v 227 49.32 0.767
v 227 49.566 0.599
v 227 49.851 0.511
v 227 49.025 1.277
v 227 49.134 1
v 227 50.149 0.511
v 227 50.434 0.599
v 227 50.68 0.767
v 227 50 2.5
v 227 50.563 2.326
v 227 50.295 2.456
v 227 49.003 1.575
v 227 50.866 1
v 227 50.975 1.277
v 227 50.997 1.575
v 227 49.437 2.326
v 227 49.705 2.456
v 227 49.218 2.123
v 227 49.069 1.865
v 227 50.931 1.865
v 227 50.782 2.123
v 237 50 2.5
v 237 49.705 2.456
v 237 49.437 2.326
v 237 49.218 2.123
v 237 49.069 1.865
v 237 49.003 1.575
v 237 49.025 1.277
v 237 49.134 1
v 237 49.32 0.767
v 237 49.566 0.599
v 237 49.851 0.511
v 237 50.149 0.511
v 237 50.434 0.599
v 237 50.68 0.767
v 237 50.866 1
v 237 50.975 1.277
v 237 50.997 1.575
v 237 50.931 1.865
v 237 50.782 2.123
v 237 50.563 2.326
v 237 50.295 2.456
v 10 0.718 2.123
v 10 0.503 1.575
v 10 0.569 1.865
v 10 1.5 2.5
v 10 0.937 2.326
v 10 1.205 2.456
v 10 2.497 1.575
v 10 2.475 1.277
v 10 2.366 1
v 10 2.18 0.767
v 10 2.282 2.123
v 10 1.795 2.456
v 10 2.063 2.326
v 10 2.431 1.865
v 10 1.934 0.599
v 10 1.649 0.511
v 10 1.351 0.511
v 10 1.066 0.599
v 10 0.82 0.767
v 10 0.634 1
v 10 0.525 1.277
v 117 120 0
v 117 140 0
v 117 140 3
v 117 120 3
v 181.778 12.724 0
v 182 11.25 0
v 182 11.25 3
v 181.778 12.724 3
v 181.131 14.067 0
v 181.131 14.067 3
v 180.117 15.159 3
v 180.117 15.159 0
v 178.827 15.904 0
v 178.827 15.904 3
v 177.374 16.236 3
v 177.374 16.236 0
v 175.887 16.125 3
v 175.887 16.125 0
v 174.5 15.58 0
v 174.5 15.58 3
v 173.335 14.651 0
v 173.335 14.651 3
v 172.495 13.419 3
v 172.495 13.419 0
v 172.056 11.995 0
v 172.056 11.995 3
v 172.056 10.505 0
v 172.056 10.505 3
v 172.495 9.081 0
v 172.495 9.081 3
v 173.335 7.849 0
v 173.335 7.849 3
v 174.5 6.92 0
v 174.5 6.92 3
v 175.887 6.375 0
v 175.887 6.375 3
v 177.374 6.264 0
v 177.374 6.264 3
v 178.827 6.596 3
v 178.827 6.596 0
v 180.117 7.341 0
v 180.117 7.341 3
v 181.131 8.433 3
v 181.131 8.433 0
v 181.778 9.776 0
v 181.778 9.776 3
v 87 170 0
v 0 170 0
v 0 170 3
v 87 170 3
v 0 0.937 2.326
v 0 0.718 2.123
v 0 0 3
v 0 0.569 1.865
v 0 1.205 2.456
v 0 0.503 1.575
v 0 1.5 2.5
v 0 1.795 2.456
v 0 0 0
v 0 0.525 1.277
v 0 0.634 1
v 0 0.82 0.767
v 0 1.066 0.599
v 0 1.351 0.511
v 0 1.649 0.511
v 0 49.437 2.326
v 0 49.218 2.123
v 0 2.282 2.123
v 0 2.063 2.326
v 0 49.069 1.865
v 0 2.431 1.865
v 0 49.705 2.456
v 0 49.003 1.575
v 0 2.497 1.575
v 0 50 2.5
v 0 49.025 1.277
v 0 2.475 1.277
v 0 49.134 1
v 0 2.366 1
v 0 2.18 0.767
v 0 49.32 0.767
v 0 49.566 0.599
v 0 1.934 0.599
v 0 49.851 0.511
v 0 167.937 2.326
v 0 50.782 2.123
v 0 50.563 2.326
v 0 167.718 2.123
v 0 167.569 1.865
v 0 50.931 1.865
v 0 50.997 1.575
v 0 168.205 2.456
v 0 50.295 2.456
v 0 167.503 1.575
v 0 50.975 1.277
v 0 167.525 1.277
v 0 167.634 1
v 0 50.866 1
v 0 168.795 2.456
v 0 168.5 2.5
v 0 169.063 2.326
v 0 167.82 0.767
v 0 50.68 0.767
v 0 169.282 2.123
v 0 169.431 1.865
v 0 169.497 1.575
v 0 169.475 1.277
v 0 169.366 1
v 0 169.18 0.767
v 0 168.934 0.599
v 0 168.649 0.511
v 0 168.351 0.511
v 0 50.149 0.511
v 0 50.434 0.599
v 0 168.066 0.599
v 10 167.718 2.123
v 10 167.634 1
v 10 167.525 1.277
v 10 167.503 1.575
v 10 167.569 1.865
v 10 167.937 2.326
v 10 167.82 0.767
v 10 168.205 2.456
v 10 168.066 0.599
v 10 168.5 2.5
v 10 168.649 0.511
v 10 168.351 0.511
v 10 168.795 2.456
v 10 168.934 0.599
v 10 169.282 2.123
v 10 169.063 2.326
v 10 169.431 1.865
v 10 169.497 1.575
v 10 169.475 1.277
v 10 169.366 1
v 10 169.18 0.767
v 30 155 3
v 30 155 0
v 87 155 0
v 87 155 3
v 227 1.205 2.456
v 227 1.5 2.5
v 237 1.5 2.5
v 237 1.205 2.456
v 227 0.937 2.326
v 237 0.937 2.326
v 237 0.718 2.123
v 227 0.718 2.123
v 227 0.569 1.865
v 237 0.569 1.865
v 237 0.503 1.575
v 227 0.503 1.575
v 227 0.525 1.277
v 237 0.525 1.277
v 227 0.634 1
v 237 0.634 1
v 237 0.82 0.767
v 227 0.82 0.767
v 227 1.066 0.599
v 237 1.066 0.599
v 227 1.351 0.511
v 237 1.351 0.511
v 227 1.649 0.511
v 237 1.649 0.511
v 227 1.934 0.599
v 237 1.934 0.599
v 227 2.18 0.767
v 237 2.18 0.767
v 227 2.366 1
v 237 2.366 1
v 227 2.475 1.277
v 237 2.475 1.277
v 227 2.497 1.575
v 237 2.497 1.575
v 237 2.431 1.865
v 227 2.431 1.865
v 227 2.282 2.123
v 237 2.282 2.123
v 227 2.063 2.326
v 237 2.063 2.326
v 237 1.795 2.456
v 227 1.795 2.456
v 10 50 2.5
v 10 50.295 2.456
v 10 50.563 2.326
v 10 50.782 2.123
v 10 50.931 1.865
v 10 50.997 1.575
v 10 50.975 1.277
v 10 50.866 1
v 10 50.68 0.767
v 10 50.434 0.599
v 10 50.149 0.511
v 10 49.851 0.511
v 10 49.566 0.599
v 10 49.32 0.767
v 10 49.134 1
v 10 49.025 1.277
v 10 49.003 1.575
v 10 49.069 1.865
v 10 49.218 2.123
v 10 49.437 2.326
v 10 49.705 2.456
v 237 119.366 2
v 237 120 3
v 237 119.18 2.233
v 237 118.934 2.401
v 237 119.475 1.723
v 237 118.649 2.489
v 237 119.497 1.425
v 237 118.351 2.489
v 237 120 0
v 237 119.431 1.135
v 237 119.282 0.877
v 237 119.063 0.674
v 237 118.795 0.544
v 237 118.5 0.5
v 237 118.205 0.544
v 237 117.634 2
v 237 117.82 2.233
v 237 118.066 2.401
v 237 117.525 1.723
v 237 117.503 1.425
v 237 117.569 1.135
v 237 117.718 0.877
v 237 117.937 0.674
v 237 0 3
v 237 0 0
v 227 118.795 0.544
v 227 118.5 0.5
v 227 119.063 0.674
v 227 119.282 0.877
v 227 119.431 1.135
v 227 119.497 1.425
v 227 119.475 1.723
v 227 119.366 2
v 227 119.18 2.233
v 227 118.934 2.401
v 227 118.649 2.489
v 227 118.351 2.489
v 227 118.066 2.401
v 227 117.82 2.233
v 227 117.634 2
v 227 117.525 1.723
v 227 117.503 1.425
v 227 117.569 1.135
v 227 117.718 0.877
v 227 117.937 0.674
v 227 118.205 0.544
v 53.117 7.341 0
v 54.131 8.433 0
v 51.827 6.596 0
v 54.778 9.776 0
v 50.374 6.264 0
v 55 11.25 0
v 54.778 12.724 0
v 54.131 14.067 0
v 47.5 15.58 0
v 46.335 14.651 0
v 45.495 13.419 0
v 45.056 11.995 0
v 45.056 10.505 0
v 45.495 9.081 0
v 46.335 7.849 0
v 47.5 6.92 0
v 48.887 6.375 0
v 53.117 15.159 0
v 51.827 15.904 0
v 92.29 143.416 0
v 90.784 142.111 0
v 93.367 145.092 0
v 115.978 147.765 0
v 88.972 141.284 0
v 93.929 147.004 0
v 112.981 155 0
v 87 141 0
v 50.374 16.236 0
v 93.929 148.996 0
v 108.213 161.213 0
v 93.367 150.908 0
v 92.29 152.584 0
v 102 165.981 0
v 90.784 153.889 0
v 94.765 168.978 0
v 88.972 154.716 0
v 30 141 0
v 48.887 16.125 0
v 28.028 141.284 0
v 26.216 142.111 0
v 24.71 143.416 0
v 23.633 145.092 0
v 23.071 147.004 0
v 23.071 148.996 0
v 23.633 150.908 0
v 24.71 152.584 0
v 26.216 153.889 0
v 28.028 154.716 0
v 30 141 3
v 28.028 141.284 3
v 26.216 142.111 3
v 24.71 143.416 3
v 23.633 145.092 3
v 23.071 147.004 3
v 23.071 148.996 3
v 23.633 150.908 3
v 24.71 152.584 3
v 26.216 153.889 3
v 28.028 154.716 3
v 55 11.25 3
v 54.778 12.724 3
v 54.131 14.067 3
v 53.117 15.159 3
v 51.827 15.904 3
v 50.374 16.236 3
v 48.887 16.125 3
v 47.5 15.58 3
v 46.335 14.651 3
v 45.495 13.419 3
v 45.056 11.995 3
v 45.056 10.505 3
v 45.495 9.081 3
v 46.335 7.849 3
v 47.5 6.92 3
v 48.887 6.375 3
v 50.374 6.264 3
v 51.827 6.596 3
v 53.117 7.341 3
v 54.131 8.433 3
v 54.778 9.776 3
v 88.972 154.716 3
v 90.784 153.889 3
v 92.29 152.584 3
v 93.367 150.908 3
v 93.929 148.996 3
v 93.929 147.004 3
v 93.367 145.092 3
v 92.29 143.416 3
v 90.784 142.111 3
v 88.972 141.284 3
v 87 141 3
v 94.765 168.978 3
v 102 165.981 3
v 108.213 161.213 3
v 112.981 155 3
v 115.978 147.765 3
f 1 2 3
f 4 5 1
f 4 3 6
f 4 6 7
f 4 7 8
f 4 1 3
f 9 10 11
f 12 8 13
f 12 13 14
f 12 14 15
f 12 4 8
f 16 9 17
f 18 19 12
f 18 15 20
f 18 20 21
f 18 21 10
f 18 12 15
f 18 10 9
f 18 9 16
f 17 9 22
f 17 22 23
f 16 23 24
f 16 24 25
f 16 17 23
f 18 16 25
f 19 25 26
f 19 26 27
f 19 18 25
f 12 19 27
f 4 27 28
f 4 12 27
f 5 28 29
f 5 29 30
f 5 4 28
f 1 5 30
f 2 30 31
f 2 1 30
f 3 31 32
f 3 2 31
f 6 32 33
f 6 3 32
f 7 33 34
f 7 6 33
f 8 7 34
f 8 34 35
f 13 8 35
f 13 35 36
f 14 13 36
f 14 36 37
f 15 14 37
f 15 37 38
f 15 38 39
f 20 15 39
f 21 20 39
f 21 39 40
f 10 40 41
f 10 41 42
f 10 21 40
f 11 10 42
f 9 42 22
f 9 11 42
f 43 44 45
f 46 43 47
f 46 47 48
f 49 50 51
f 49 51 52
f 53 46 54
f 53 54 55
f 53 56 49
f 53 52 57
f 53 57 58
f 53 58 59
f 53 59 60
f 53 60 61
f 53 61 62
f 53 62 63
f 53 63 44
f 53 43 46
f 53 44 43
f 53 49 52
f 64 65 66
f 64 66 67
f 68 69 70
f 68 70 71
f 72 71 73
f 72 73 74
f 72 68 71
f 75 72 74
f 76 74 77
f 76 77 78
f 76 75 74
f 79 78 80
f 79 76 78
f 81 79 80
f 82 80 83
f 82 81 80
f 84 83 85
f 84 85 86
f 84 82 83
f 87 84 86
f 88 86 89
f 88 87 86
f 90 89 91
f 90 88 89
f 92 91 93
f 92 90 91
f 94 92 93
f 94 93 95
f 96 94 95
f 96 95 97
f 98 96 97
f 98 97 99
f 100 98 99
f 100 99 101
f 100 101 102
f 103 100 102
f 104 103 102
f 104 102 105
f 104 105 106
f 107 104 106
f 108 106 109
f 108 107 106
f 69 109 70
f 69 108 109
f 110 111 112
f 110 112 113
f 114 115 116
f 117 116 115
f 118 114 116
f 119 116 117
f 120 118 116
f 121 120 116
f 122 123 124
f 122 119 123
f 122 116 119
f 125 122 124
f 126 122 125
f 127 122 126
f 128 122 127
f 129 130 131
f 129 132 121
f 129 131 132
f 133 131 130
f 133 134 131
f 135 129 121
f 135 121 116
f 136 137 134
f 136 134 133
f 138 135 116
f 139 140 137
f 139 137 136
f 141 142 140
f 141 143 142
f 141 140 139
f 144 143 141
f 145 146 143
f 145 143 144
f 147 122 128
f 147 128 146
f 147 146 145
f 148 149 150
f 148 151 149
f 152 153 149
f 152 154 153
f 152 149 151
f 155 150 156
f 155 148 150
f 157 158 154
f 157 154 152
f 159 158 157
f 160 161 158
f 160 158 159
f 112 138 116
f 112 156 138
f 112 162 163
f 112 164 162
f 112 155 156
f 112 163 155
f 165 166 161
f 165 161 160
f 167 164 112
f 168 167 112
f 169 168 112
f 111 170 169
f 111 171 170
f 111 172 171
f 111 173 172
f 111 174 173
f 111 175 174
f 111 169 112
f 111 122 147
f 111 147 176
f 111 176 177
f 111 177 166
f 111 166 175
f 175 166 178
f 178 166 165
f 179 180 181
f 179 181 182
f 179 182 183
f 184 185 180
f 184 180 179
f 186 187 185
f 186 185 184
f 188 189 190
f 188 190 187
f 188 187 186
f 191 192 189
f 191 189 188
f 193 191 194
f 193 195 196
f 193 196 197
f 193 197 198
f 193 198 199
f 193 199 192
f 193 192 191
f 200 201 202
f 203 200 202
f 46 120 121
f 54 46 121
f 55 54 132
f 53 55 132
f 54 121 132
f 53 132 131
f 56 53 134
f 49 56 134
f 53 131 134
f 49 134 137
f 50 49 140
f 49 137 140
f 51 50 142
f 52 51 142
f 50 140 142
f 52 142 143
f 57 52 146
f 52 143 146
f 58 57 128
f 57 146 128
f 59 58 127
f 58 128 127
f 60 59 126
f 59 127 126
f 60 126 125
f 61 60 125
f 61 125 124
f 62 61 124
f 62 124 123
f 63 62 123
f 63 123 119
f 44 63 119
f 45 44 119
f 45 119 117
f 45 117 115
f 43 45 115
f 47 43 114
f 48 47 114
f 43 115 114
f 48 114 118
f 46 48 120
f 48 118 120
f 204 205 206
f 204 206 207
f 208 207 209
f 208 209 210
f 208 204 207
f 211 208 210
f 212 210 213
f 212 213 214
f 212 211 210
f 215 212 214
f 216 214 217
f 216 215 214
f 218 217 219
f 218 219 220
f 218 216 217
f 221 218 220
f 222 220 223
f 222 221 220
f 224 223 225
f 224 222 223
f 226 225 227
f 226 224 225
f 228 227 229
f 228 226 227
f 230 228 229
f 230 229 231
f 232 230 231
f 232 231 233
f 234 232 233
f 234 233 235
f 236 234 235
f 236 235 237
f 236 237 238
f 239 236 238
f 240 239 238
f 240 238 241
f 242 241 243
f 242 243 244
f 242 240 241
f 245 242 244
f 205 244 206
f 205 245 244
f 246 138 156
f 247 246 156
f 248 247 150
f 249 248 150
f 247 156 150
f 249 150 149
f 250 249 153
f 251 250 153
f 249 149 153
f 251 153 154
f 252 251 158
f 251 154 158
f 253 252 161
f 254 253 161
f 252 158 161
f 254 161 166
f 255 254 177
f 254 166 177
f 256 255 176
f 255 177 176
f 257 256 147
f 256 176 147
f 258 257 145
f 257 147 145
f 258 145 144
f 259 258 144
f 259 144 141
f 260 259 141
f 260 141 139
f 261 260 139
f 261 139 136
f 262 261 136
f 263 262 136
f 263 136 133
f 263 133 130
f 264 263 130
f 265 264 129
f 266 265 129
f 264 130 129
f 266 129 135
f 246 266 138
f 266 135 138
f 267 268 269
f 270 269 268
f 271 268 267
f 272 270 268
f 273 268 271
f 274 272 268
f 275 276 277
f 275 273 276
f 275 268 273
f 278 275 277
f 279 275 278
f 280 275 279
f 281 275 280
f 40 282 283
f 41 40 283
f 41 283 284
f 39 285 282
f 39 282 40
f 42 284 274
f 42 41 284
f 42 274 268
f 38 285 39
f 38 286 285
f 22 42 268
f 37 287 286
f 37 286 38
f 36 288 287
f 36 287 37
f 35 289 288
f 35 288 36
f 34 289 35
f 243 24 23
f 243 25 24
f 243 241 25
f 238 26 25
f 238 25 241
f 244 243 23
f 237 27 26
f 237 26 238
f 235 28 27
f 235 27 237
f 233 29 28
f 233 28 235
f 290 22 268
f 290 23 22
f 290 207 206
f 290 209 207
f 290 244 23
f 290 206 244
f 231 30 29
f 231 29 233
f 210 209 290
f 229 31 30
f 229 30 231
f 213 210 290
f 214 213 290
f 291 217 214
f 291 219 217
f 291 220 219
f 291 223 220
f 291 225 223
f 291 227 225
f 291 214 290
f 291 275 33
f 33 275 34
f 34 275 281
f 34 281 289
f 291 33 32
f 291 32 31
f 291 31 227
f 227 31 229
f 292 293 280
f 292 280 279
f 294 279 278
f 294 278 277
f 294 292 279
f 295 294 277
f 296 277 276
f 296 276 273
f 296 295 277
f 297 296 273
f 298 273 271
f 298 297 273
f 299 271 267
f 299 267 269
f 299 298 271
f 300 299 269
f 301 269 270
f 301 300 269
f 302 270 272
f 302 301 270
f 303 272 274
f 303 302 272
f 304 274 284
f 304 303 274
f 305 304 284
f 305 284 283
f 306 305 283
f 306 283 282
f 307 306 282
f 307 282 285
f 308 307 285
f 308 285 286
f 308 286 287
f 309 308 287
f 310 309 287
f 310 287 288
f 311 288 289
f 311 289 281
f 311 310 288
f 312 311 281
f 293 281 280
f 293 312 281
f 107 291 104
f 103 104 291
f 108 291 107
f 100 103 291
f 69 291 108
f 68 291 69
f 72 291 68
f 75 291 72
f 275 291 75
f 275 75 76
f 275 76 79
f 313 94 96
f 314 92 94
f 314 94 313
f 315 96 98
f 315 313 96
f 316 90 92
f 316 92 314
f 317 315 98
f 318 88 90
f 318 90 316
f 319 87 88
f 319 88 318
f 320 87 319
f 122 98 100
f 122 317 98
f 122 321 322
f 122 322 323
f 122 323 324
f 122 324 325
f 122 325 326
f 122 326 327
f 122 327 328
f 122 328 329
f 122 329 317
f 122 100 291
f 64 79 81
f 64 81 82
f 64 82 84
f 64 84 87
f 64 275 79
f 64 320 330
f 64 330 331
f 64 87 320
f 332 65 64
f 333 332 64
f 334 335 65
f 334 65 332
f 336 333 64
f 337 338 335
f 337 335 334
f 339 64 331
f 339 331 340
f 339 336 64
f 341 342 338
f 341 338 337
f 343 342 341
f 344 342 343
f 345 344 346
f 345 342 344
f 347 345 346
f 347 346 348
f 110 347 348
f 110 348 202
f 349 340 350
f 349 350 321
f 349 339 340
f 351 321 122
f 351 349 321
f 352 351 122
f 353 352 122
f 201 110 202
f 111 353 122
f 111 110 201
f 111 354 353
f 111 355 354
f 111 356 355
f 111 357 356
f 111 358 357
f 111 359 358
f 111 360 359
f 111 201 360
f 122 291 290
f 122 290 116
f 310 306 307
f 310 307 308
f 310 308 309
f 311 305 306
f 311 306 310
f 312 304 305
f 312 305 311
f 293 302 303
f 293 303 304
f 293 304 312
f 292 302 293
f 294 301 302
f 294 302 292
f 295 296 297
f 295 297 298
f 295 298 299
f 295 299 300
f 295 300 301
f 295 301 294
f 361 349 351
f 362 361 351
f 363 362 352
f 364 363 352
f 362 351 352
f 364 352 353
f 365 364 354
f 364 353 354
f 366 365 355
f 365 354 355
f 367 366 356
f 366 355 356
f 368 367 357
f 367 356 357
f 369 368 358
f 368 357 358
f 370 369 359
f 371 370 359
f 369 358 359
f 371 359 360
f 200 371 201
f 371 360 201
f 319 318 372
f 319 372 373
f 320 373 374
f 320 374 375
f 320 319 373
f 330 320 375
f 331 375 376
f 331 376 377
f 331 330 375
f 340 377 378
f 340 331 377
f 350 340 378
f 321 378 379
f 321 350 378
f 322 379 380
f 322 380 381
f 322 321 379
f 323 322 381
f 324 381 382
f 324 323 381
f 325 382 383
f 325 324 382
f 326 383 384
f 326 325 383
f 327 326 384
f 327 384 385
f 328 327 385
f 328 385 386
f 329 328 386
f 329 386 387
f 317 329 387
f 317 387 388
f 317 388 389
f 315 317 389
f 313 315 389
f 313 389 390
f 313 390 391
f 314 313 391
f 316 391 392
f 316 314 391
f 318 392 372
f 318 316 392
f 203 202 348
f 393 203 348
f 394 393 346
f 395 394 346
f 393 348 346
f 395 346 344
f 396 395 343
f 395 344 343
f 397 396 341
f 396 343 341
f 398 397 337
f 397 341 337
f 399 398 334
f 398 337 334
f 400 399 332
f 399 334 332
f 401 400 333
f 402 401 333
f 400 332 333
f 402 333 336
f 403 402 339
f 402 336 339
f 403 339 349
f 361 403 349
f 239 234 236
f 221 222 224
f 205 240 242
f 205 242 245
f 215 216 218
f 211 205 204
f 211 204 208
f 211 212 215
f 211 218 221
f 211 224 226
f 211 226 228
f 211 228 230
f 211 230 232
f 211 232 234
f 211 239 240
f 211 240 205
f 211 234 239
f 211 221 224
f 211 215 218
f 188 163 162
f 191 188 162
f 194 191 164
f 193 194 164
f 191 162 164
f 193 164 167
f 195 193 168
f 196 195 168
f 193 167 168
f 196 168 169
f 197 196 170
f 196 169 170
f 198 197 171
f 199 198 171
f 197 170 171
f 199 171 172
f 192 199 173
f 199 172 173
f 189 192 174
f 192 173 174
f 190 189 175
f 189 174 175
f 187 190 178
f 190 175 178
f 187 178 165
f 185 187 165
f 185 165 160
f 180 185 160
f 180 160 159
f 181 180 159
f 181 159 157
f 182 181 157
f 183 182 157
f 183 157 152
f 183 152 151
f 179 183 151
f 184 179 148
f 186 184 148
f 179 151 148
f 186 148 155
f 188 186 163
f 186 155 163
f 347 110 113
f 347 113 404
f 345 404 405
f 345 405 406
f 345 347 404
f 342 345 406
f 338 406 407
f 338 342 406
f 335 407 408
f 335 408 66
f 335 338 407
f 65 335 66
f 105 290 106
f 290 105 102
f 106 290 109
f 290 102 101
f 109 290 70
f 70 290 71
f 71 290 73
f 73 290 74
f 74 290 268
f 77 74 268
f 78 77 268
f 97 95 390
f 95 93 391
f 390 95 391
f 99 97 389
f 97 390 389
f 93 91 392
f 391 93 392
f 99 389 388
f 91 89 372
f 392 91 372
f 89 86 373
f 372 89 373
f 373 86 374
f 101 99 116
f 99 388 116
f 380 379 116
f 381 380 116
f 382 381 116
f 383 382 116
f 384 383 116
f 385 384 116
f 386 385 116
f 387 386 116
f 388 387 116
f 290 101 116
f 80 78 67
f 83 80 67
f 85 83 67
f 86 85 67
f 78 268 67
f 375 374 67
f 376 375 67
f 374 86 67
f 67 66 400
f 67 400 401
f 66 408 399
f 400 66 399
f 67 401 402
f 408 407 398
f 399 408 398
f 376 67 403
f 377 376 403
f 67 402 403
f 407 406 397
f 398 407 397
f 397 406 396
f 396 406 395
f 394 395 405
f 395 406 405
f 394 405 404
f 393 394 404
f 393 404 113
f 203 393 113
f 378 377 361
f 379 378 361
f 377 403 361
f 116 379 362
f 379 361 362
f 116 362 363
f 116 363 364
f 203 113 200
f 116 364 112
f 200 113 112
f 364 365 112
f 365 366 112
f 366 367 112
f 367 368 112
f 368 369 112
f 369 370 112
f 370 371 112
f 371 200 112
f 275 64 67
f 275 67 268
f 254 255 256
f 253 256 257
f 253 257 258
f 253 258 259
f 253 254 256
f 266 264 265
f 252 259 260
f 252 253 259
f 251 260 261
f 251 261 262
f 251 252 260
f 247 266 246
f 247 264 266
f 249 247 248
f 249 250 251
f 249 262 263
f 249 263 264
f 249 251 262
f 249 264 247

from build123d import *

# Parameters (mm, degrees)
SKETCH2_R           = 5
BOSS_EXTRUDE1_DEPTH = 3
SKETCH3_R           = 1
CUT_EXTRUDE1_DEPTH  = 10
SKETCH5_R           = 1
CUT_EXTRUDE2_DEPTH  = 10
CUT_EXTRUDE3_START  = -10
SKETCH6_R           = 1
CUT_EXTRUDE3_DEPTH  = 10


with BuildPart() as part:
    # Sketch2 → Boss-Extrude1 (new body)
    with BuildSketch(Plane.XY):
        with BuildLine():
            Line((117, 140), (117, 120))
            Line((117, 120), (237, 120))
            Line((237, 120), (237, 0))
            Line((237, 0), (0, 0))
            Line((0, 0), (0, 170))
            Line((0, 170), (87, 170))
            ThreePointArc((87, 170), (108.213203436, 161.213203436), (117, 140))
        make_face()
        with Locations((50, 11.25)):
            Circle(SKETCH2_R, mode=Mode.SUBTRACT)
        with Locations((177, 11.25)):
            Circle(SKETCH2_R, mode=Mode.SUBTRACT)
        with BuildLine():
            Line((30, 155), (87, 155))
            ThreePointArc((87, 155), (94, 148), (87, 141))
            Line((87, 141), (30, 141))
            ThreePointArc((30, 141), (23, 148), (30, 155))
        make_face(mode=Mode.SUBTRACT)
    extrude(amount=BOSS_EXTRUDE1_DEPTH)

    # Sketch3 → Cut-Extrude1 (cut)
    with BuildSketch(Plane.ZY):
        with Locations((1.5, 168.5)):
            Circle(SKETCH3_R)
        with Locations((1.5, 1.5)):
            Circle(SKETCH3_R)
    extrude(amount=-CUT_EXTRUDE1_DEPTH, mode=Mode.SUBTRACT)

    # Sketch5 → Cut-Extrude2 (cut)
    with BuildSketch(Plane.ZY):
        with Locations((1.5, 50)):
            Circle(SKETCH5_R)
    extrude(amount=-CUT_EXTRUDE2_DEPTH, mode=Mode.SUBTRACT)

    # Sketch6 → Cut-Extrude3 (cut)
    with BuildSketch(Plane(origin=(237, 0, 0), x_dir=(0, 0, -1), z_dir=(1, 0, 0)).offset(CUT_EXTRUDE3_START)):
        with Locations((-1.5, 118.5)):
            Circle(SKETCH6_R)
        with Locations((-1.5, 1.5)):
            Circle(SKETCH6_R)
        with Locations((-1.5, 50)):
            Circle(SKETCH6_R)
    extrude(amount=CUT_EXTRUDE3_DEPTH, mode=Mode.SUBTRACT)


solid = part.part
